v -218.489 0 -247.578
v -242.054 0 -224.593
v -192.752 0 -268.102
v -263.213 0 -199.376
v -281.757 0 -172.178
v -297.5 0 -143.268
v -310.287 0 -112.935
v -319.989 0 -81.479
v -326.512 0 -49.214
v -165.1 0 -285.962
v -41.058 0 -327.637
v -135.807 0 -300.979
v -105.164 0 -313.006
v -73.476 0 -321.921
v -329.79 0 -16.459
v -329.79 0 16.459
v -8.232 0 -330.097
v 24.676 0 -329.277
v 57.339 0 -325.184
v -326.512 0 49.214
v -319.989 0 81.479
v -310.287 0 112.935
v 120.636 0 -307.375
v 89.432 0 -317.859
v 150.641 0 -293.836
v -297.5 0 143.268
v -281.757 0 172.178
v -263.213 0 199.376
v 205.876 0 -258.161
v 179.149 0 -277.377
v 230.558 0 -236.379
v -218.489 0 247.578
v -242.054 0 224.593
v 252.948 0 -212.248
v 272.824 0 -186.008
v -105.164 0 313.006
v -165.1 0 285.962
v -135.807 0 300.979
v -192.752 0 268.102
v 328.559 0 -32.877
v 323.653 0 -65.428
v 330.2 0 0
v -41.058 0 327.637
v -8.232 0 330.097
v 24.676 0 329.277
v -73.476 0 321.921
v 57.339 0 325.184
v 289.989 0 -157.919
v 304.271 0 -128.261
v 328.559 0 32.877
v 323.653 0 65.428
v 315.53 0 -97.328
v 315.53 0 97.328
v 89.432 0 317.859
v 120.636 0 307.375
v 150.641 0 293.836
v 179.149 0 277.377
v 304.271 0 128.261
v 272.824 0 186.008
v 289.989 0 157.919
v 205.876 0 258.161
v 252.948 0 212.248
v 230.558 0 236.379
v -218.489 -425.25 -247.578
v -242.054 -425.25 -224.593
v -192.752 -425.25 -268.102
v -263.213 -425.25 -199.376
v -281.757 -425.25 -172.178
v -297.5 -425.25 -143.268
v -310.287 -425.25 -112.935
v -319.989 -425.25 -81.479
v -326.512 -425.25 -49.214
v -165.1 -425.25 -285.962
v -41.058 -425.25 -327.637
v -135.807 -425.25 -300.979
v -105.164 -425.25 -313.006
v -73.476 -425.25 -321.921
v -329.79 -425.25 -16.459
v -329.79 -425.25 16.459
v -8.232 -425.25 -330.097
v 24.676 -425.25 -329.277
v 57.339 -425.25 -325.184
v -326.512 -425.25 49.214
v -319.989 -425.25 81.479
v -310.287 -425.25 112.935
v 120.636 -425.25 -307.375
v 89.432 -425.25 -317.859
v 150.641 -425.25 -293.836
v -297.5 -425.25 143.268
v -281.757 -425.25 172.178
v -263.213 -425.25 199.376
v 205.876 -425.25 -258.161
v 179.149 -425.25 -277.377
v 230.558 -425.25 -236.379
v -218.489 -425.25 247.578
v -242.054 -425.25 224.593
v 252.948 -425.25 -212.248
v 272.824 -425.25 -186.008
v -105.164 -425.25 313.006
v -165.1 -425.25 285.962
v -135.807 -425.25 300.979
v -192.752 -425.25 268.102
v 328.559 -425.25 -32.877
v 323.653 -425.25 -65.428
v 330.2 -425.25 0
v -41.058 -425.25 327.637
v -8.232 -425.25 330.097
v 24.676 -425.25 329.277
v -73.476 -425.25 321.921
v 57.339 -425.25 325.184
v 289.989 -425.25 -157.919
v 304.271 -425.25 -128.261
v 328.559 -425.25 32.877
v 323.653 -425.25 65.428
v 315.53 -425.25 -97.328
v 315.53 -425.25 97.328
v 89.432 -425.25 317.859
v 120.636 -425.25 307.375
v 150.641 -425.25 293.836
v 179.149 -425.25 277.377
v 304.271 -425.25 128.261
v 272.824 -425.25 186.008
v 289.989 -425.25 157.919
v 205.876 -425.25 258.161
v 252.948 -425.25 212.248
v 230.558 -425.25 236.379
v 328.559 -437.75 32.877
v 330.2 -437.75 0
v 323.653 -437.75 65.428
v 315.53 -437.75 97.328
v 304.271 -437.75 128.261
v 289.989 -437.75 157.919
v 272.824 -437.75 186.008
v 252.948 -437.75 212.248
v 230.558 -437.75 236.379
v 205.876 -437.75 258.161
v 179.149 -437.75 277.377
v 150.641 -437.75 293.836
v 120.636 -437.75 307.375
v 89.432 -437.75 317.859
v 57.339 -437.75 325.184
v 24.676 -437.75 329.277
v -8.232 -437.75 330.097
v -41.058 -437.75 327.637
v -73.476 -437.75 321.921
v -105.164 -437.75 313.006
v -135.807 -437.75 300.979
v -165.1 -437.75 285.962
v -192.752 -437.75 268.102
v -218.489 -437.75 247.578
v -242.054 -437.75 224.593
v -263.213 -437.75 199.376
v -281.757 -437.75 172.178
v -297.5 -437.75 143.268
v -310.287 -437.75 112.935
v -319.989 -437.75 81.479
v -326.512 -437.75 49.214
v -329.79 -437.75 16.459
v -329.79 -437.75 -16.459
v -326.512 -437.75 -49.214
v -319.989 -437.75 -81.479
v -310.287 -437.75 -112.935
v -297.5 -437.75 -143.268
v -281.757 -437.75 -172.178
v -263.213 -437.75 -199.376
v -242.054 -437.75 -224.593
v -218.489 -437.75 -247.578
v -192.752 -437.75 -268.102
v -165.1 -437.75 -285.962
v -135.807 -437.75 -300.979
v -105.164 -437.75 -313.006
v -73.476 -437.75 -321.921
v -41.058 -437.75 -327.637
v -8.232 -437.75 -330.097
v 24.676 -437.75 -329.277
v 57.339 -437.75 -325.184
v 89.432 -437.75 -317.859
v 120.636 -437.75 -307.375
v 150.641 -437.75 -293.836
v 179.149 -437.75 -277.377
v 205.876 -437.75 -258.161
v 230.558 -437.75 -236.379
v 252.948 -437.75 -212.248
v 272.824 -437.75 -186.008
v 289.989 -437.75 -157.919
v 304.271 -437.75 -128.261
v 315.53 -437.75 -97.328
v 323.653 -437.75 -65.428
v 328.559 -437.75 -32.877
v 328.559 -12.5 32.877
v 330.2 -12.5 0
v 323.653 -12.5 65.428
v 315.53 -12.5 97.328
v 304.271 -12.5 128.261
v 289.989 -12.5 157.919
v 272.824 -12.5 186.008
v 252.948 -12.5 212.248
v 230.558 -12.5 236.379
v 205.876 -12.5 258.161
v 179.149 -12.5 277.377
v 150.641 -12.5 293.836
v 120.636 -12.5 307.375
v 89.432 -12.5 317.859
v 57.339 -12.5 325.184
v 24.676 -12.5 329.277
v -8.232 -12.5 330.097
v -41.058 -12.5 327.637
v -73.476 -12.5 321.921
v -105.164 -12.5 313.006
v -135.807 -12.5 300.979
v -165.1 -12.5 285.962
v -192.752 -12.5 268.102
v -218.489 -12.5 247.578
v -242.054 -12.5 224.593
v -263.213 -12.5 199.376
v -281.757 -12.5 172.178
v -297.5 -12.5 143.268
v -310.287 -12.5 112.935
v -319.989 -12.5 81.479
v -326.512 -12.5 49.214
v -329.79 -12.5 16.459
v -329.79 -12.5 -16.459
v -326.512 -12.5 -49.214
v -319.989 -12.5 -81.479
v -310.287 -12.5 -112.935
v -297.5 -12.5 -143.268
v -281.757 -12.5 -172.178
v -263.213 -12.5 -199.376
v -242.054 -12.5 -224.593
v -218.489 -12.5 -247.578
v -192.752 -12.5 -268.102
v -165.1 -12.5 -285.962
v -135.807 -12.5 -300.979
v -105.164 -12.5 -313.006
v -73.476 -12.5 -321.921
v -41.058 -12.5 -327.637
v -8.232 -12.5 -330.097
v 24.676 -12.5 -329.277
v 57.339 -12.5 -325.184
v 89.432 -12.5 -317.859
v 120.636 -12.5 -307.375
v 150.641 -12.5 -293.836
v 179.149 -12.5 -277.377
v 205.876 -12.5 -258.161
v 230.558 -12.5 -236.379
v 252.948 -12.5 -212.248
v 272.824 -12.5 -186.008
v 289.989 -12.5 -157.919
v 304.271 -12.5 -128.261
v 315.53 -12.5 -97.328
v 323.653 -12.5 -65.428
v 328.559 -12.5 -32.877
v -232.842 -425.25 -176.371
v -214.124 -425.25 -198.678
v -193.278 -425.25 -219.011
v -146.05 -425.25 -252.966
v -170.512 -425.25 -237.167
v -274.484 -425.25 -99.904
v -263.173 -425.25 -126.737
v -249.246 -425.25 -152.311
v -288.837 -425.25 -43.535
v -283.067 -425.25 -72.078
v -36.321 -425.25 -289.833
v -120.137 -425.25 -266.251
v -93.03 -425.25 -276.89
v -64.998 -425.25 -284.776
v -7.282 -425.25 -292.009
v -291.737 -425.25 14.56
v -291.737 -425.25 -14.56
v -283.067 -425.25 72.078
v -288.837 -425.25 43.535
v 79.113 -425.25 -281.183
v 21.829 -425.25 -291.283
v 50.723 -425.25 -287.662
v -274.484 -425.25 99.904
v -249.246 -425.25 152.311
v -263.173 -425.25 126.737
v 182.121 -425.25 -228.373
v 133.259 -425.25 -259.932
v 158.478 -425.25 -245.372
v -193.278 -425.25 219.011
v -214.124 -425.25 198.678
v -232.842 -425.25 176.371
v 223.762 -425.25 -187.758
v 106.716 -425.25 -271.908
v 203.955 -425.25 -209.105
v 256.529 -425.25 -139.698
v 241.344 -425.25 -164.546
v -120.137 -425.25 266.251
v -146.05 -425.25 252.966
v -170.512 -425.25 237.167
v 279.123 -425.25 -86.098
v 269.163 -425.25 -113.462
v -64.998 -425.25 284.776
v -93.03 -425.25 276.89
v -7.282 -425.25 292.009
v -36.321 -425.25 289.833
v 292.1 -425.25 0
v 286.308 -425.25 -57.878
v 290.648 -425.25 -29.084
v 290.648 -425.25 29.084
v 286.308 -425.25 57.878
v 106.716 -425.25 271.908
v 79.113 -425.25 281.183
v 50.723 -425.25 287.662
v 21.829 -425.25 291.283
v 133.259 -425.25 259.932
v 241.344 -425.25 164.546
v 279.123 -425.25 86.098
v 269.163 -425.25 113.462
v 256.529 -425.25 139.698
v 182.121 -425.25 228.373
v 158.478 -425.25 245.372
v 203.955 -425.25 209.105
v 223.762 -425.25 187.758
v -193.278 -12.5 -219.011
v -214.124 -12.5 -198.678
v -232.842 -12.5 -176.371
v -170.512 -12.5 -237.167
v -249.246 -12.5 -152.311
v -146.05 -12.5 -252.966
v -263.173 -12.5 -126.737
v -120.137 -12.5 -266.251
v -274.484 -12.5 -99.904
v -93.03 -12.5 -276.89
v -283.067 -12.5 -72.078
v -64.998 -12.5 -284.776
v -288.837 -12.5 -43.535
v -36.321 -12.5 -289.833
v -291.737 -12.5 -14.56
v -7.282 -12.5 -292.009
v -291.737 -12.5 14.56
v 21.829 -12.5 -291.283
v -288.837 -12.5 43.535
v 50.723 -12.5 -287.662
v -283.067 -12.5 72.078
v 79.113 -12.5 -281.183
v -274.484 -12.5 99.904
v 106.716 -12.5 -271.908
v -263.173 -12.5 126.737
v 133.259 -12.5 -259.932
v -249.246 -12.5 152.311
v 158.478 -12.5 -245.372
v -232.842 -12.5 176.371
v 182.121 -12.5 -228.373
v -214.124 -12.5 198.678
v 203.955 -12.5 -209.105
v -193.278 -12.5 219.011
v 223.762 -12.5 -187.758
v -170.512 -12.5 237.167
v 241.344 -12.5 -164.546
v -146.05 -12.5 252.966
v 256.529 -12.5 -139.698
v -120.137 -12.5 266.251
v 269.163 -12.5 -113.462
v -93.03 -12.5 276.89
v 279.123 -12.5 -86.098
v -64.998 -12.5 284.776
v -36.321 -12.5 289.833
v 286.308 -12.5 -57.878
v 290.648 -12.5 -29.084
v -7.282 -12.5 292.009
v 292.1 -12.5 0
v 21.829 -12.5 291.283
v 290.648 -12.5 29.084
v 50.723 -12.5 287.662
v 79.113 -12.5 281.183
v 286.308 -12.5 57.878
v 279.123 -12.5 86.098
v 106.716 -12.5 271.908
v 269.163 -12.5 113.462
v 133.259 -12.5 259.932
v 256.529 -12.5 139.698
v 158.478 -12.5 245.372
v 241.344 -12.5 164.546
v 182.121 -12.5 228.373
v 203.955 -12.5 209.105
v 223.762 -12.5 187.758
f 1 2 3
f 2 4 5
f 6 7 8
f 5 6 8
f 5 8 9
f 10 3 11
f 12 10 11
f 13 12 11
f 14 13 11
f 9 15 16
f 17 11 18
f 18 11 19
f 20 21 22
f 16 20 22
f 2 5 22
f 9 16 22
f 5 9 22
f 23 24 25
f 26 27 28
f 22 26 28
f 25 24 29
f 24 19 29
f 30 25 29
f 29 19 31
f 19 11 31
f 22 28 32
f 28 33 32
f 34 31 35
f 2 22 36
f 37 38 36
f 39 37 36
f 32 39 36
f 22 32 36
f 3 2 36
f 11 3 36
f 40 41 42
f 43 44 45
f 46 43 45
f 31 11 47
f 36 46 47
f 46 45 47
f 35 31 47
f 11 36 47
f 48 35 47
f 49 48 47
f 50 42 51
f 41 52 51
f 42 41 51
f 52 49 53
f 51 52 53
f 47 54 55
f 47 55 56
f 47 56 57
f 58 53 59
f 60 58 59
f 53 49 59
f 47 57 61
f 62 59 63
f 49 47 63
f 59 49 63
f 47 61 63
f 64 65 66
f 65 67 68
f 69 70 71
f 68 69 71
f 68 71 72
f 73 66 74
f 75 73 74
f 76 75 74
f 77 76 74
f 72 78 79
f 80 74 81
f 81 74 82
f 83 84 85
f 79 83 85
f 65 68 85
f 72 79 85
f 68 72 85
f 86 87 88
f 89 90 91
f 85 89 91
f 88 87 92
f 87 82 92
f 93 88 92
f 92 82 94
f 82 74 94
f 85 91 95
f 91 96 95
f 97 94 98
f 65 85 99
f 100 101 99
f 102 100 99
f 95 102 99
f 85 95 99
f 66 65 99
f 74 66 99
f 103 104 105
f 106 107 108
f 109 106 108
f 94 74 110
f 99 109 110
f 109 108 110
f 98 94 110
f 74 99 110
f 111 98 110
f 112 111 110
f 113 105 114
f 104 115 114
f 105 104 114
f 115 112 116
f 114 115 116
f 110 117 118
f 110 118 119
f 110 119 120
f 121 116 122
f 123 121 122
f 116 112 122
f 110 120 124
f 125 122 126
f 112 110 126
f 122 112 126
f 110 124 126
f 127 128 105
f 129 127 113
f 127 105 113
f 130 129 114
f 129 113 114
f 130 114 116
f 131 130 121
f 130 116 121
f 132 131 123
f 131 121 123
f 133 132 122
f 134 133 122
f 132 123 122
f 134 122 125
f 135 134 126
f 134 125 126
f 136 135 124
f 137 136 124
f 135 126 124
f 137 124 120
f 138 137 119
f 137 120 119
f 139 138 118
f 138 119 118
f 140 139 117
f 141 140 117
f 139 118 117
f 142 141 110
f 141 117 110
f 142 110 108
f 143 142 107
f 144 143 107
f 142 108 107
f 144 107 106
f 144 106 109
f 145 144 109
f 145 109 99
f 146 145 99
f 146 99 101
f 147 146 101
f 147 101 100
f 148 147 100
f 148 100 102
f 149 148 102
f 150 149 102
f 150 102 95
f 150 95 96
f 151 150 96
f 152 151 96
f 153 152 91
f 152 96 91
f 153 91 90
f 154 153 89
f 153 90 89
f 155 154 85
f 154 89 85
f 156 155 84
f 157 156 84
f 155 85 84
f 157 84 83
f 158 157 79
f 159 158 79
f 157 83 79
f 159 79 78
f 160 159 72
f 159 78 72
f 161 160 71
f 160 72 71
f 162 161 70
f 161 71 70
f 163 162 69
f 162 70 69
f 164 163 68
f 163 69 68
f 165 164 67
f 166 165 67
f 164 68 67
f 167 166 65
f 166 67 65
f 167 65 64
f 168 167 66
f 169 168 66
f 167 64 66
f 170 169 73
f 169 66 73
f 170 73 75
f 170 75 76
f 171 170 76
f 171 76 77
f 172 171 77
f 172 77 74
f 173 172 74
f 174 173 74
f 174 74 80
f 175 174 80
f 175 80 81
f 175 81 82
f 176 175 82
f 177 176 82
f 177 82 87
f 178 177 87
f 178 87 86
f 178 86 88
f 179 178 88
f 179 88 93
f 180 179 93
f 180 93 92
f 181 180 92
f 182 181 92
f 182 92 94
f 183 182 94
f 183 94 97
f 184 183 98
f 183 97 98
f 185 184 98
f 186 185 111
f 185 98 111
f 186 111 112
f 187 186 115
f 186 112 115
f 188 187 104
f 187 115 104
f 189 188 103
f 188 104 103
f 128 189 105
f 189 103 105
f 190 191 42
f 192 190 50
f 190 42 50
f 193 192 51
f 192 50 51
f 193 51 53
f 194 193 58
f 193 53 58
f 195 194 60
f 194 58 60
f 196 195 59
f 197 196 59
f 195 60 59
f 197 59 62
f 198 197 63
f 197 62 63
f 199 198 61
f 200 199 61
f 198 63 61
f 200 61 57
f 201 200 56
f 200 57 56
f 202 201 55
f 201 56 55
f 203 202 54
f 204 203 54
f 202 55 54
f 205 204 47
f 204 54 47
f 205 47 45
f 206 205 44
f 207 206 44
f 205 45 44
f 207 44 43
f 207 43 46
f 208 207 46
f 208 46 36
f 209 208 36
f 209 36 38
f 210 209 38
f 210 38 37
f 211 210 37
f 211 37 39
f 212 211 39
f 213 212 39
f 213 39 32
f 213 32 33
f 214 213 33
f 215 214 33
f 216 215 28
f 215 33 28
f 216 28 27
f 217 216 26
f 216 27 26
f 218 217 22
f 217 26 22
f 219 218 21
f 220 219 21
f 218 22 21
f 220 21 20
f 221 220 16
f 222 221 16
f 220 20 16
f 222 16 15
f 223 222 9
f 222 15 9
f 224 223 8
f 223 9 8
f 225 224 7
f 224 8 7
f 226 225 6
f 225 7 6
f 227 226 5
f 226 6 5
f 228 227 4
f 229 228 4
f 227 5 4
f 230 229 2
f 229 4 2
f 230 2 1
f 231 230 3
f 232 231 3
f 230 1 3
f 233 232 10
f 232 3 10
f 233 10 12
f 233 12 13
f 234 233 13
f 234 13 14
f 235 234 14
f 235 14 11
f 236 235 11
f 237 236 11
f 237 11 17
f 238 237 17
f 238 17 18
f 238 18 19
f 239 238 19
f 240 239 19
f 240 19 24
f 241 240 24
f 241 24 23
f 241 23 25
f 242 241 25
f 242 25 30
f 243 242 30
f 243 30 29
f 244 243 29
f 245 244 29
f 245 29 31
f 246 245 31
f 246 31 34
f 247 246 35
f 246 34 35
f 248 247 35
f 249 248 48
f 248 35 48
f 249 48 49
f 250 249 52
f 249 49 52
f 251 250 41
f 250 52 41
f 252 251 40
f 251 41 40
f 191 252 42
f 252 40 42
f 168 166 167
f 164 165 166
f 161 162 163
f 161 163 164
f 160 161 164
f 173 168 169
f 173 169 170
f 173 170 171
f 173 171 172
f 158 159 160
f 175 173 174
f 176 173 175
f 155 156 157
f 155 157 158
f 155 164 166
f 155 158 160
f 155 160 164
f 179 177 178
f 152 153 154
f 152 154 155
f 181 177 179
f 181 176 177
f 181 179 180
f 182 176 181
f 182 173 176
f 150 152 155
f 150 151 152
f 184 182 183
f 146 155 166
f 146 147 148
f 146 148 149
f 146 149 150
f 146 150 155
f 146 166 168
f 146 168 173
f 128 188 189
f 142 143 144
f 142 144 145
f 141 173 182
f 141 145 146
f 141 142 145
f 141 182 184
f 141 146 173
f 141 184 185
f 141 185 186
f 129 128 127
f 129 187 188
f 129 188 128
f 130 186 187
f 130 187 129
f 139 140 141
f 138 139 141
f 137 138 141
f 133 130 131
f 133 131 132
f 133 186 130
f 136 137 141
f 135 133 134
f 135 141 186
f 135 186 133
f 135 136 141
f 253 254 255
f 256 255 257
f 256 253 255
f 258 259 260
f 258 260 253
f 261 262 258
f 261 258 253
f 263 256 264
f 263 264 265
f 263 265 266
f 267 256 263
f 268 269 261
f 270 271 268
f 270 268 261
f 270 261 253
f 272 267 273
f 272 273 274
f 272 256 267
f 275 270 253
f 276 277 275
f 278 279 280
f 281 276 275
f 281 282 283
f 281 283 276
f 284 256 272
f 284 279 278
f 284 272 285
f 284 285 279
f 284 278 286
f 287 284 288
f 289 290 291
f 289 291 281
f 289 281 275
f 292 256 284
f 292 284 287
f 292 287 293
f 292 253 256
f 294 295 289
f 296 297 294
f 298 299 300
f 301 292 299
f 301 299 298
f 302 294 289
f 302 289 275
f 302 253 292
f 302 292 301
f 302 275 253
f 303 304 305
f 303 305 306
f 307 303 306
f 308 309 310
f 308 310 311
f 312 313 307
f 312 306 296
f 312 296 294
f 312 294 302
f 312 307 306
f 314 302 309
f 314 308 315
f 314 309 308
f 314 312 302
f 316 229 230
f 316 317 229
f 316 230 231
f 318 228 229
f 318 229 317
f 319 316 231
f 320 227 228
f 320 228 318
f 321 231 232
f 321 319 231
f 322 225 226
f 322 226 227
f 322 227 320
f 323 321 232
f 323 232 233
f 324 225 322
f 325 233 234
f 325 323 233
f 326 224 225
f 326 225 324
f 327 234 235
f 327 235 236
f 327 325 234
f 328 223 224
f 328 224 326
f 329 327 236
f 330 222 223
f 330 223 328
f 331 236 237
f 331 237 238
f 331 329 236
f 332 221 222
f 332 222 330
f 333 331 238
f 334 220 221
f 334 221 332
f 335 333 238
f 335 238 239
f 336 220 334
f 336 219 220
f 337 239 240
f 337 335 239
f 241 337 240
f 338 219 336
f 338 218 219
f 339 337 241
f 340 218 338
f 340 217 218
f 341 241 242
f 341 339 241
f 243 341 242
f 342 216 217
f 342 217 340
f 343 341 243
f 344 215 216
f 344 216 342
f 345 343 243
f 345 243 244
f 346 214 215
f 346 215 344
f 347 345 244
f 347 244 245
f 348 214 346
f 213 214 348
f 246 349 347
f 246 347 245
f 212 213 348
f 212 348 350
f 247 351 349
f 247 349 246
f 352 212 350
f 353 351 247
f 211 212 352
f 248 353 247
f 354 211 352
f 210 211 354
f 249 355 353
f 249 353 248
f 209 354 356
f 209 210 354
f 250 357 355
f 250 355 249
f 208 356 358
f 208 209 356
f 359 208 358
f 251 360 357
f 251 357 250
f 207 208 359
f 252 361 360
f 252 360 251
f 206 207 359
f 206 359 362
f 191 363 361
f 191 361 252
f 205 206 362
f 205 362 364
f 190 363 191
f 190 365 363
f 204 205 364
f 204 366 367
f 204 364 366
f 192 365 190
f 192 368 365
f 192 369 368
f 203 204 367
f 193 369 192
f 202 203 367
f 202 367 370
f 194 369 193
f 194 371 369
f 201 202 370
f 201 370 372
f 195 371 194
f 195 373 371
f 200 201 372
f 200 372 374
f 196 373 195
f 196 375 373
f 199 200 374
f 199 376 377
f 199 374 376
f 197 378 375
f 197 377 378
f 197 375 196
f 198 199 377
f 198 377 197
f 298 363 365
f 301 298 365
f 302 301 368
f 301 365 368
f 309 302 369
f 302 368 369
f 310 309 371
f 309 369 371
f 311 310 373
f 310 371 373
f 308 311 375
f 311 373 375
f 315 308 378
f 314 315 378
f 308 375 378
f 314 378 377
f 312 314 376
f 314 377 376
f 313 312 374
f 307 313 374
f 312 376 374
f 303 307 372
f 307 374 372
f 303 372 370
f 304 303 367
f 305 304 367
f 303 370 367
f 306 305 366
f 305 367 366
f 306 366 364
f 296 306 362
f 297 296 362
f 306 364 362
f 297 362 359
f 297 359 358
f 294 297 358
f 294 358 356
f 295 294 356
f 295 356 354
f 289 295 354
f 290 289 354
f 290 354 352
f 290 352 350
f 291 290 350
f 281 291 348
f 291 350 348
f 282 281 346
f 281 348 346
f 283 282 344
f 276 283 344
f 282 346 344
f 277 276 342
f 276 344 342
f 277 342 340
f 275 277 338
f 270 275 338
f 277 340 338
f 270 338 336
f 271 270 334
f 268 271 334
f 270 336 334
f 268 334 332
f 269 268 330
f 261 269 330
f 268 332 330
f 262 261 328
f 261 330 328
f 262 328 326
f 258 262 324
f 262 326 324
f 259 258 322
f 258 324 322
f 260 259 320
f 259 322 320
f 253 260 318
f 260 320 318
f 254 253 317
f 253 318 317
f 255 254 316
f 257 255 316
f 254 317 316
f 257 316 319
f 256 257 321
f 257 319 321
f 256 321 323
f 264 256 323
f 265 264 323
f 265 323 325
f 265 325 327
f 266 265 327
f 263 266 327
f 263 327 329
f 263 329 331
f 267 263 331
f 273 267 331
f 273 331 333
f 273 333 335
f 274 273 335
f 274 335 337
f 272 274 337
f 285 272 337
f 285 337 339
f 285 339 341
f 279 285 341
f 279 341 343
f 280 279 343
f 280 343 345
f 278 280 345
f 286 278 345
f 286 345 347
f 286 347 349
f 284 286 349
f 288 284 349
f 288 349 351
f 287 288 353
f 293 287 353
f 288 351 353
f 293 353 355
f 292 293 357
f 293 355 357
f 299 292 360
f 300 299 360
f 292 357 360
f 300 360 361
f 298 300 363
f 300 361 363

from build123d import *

# Parameters (mm, degrees)
F0_R     = 330.2
F1_DEPTH = 12.5
F2_R     = 292.1
F3_DEPTH = 412.75
F4_R     = 330.2
F4_R_2   = 292.1
F5_DEPTH = 12.5


with BuildPart() as f1:
    # F0 (on Front) → F1 (new body)
    with BuildSketch(Plane.XZ):
        Circle(F0_R)
    extrude(amount=F1_DEPTH)

    # F2 (on face) → F3 (join)
    with BuildSketch(Plane.XZ.offset(12.5)):
        Circle(F2_R)
    extrude(amount=F3_DEPTH)


with BuildPart() as f5:
    # F4 (on face) → F5 (new body)
    with BuildSketch(Plane.XZ.offset(425.25)):
        Circle(F4_R)
        Circle(F4_R_2, mode=Mode.SUBTRACT)
        Circle(F4_R_2)
    extrude(amount=F5_DEPTH)


solid = Compound([f1.part, f5.part])
